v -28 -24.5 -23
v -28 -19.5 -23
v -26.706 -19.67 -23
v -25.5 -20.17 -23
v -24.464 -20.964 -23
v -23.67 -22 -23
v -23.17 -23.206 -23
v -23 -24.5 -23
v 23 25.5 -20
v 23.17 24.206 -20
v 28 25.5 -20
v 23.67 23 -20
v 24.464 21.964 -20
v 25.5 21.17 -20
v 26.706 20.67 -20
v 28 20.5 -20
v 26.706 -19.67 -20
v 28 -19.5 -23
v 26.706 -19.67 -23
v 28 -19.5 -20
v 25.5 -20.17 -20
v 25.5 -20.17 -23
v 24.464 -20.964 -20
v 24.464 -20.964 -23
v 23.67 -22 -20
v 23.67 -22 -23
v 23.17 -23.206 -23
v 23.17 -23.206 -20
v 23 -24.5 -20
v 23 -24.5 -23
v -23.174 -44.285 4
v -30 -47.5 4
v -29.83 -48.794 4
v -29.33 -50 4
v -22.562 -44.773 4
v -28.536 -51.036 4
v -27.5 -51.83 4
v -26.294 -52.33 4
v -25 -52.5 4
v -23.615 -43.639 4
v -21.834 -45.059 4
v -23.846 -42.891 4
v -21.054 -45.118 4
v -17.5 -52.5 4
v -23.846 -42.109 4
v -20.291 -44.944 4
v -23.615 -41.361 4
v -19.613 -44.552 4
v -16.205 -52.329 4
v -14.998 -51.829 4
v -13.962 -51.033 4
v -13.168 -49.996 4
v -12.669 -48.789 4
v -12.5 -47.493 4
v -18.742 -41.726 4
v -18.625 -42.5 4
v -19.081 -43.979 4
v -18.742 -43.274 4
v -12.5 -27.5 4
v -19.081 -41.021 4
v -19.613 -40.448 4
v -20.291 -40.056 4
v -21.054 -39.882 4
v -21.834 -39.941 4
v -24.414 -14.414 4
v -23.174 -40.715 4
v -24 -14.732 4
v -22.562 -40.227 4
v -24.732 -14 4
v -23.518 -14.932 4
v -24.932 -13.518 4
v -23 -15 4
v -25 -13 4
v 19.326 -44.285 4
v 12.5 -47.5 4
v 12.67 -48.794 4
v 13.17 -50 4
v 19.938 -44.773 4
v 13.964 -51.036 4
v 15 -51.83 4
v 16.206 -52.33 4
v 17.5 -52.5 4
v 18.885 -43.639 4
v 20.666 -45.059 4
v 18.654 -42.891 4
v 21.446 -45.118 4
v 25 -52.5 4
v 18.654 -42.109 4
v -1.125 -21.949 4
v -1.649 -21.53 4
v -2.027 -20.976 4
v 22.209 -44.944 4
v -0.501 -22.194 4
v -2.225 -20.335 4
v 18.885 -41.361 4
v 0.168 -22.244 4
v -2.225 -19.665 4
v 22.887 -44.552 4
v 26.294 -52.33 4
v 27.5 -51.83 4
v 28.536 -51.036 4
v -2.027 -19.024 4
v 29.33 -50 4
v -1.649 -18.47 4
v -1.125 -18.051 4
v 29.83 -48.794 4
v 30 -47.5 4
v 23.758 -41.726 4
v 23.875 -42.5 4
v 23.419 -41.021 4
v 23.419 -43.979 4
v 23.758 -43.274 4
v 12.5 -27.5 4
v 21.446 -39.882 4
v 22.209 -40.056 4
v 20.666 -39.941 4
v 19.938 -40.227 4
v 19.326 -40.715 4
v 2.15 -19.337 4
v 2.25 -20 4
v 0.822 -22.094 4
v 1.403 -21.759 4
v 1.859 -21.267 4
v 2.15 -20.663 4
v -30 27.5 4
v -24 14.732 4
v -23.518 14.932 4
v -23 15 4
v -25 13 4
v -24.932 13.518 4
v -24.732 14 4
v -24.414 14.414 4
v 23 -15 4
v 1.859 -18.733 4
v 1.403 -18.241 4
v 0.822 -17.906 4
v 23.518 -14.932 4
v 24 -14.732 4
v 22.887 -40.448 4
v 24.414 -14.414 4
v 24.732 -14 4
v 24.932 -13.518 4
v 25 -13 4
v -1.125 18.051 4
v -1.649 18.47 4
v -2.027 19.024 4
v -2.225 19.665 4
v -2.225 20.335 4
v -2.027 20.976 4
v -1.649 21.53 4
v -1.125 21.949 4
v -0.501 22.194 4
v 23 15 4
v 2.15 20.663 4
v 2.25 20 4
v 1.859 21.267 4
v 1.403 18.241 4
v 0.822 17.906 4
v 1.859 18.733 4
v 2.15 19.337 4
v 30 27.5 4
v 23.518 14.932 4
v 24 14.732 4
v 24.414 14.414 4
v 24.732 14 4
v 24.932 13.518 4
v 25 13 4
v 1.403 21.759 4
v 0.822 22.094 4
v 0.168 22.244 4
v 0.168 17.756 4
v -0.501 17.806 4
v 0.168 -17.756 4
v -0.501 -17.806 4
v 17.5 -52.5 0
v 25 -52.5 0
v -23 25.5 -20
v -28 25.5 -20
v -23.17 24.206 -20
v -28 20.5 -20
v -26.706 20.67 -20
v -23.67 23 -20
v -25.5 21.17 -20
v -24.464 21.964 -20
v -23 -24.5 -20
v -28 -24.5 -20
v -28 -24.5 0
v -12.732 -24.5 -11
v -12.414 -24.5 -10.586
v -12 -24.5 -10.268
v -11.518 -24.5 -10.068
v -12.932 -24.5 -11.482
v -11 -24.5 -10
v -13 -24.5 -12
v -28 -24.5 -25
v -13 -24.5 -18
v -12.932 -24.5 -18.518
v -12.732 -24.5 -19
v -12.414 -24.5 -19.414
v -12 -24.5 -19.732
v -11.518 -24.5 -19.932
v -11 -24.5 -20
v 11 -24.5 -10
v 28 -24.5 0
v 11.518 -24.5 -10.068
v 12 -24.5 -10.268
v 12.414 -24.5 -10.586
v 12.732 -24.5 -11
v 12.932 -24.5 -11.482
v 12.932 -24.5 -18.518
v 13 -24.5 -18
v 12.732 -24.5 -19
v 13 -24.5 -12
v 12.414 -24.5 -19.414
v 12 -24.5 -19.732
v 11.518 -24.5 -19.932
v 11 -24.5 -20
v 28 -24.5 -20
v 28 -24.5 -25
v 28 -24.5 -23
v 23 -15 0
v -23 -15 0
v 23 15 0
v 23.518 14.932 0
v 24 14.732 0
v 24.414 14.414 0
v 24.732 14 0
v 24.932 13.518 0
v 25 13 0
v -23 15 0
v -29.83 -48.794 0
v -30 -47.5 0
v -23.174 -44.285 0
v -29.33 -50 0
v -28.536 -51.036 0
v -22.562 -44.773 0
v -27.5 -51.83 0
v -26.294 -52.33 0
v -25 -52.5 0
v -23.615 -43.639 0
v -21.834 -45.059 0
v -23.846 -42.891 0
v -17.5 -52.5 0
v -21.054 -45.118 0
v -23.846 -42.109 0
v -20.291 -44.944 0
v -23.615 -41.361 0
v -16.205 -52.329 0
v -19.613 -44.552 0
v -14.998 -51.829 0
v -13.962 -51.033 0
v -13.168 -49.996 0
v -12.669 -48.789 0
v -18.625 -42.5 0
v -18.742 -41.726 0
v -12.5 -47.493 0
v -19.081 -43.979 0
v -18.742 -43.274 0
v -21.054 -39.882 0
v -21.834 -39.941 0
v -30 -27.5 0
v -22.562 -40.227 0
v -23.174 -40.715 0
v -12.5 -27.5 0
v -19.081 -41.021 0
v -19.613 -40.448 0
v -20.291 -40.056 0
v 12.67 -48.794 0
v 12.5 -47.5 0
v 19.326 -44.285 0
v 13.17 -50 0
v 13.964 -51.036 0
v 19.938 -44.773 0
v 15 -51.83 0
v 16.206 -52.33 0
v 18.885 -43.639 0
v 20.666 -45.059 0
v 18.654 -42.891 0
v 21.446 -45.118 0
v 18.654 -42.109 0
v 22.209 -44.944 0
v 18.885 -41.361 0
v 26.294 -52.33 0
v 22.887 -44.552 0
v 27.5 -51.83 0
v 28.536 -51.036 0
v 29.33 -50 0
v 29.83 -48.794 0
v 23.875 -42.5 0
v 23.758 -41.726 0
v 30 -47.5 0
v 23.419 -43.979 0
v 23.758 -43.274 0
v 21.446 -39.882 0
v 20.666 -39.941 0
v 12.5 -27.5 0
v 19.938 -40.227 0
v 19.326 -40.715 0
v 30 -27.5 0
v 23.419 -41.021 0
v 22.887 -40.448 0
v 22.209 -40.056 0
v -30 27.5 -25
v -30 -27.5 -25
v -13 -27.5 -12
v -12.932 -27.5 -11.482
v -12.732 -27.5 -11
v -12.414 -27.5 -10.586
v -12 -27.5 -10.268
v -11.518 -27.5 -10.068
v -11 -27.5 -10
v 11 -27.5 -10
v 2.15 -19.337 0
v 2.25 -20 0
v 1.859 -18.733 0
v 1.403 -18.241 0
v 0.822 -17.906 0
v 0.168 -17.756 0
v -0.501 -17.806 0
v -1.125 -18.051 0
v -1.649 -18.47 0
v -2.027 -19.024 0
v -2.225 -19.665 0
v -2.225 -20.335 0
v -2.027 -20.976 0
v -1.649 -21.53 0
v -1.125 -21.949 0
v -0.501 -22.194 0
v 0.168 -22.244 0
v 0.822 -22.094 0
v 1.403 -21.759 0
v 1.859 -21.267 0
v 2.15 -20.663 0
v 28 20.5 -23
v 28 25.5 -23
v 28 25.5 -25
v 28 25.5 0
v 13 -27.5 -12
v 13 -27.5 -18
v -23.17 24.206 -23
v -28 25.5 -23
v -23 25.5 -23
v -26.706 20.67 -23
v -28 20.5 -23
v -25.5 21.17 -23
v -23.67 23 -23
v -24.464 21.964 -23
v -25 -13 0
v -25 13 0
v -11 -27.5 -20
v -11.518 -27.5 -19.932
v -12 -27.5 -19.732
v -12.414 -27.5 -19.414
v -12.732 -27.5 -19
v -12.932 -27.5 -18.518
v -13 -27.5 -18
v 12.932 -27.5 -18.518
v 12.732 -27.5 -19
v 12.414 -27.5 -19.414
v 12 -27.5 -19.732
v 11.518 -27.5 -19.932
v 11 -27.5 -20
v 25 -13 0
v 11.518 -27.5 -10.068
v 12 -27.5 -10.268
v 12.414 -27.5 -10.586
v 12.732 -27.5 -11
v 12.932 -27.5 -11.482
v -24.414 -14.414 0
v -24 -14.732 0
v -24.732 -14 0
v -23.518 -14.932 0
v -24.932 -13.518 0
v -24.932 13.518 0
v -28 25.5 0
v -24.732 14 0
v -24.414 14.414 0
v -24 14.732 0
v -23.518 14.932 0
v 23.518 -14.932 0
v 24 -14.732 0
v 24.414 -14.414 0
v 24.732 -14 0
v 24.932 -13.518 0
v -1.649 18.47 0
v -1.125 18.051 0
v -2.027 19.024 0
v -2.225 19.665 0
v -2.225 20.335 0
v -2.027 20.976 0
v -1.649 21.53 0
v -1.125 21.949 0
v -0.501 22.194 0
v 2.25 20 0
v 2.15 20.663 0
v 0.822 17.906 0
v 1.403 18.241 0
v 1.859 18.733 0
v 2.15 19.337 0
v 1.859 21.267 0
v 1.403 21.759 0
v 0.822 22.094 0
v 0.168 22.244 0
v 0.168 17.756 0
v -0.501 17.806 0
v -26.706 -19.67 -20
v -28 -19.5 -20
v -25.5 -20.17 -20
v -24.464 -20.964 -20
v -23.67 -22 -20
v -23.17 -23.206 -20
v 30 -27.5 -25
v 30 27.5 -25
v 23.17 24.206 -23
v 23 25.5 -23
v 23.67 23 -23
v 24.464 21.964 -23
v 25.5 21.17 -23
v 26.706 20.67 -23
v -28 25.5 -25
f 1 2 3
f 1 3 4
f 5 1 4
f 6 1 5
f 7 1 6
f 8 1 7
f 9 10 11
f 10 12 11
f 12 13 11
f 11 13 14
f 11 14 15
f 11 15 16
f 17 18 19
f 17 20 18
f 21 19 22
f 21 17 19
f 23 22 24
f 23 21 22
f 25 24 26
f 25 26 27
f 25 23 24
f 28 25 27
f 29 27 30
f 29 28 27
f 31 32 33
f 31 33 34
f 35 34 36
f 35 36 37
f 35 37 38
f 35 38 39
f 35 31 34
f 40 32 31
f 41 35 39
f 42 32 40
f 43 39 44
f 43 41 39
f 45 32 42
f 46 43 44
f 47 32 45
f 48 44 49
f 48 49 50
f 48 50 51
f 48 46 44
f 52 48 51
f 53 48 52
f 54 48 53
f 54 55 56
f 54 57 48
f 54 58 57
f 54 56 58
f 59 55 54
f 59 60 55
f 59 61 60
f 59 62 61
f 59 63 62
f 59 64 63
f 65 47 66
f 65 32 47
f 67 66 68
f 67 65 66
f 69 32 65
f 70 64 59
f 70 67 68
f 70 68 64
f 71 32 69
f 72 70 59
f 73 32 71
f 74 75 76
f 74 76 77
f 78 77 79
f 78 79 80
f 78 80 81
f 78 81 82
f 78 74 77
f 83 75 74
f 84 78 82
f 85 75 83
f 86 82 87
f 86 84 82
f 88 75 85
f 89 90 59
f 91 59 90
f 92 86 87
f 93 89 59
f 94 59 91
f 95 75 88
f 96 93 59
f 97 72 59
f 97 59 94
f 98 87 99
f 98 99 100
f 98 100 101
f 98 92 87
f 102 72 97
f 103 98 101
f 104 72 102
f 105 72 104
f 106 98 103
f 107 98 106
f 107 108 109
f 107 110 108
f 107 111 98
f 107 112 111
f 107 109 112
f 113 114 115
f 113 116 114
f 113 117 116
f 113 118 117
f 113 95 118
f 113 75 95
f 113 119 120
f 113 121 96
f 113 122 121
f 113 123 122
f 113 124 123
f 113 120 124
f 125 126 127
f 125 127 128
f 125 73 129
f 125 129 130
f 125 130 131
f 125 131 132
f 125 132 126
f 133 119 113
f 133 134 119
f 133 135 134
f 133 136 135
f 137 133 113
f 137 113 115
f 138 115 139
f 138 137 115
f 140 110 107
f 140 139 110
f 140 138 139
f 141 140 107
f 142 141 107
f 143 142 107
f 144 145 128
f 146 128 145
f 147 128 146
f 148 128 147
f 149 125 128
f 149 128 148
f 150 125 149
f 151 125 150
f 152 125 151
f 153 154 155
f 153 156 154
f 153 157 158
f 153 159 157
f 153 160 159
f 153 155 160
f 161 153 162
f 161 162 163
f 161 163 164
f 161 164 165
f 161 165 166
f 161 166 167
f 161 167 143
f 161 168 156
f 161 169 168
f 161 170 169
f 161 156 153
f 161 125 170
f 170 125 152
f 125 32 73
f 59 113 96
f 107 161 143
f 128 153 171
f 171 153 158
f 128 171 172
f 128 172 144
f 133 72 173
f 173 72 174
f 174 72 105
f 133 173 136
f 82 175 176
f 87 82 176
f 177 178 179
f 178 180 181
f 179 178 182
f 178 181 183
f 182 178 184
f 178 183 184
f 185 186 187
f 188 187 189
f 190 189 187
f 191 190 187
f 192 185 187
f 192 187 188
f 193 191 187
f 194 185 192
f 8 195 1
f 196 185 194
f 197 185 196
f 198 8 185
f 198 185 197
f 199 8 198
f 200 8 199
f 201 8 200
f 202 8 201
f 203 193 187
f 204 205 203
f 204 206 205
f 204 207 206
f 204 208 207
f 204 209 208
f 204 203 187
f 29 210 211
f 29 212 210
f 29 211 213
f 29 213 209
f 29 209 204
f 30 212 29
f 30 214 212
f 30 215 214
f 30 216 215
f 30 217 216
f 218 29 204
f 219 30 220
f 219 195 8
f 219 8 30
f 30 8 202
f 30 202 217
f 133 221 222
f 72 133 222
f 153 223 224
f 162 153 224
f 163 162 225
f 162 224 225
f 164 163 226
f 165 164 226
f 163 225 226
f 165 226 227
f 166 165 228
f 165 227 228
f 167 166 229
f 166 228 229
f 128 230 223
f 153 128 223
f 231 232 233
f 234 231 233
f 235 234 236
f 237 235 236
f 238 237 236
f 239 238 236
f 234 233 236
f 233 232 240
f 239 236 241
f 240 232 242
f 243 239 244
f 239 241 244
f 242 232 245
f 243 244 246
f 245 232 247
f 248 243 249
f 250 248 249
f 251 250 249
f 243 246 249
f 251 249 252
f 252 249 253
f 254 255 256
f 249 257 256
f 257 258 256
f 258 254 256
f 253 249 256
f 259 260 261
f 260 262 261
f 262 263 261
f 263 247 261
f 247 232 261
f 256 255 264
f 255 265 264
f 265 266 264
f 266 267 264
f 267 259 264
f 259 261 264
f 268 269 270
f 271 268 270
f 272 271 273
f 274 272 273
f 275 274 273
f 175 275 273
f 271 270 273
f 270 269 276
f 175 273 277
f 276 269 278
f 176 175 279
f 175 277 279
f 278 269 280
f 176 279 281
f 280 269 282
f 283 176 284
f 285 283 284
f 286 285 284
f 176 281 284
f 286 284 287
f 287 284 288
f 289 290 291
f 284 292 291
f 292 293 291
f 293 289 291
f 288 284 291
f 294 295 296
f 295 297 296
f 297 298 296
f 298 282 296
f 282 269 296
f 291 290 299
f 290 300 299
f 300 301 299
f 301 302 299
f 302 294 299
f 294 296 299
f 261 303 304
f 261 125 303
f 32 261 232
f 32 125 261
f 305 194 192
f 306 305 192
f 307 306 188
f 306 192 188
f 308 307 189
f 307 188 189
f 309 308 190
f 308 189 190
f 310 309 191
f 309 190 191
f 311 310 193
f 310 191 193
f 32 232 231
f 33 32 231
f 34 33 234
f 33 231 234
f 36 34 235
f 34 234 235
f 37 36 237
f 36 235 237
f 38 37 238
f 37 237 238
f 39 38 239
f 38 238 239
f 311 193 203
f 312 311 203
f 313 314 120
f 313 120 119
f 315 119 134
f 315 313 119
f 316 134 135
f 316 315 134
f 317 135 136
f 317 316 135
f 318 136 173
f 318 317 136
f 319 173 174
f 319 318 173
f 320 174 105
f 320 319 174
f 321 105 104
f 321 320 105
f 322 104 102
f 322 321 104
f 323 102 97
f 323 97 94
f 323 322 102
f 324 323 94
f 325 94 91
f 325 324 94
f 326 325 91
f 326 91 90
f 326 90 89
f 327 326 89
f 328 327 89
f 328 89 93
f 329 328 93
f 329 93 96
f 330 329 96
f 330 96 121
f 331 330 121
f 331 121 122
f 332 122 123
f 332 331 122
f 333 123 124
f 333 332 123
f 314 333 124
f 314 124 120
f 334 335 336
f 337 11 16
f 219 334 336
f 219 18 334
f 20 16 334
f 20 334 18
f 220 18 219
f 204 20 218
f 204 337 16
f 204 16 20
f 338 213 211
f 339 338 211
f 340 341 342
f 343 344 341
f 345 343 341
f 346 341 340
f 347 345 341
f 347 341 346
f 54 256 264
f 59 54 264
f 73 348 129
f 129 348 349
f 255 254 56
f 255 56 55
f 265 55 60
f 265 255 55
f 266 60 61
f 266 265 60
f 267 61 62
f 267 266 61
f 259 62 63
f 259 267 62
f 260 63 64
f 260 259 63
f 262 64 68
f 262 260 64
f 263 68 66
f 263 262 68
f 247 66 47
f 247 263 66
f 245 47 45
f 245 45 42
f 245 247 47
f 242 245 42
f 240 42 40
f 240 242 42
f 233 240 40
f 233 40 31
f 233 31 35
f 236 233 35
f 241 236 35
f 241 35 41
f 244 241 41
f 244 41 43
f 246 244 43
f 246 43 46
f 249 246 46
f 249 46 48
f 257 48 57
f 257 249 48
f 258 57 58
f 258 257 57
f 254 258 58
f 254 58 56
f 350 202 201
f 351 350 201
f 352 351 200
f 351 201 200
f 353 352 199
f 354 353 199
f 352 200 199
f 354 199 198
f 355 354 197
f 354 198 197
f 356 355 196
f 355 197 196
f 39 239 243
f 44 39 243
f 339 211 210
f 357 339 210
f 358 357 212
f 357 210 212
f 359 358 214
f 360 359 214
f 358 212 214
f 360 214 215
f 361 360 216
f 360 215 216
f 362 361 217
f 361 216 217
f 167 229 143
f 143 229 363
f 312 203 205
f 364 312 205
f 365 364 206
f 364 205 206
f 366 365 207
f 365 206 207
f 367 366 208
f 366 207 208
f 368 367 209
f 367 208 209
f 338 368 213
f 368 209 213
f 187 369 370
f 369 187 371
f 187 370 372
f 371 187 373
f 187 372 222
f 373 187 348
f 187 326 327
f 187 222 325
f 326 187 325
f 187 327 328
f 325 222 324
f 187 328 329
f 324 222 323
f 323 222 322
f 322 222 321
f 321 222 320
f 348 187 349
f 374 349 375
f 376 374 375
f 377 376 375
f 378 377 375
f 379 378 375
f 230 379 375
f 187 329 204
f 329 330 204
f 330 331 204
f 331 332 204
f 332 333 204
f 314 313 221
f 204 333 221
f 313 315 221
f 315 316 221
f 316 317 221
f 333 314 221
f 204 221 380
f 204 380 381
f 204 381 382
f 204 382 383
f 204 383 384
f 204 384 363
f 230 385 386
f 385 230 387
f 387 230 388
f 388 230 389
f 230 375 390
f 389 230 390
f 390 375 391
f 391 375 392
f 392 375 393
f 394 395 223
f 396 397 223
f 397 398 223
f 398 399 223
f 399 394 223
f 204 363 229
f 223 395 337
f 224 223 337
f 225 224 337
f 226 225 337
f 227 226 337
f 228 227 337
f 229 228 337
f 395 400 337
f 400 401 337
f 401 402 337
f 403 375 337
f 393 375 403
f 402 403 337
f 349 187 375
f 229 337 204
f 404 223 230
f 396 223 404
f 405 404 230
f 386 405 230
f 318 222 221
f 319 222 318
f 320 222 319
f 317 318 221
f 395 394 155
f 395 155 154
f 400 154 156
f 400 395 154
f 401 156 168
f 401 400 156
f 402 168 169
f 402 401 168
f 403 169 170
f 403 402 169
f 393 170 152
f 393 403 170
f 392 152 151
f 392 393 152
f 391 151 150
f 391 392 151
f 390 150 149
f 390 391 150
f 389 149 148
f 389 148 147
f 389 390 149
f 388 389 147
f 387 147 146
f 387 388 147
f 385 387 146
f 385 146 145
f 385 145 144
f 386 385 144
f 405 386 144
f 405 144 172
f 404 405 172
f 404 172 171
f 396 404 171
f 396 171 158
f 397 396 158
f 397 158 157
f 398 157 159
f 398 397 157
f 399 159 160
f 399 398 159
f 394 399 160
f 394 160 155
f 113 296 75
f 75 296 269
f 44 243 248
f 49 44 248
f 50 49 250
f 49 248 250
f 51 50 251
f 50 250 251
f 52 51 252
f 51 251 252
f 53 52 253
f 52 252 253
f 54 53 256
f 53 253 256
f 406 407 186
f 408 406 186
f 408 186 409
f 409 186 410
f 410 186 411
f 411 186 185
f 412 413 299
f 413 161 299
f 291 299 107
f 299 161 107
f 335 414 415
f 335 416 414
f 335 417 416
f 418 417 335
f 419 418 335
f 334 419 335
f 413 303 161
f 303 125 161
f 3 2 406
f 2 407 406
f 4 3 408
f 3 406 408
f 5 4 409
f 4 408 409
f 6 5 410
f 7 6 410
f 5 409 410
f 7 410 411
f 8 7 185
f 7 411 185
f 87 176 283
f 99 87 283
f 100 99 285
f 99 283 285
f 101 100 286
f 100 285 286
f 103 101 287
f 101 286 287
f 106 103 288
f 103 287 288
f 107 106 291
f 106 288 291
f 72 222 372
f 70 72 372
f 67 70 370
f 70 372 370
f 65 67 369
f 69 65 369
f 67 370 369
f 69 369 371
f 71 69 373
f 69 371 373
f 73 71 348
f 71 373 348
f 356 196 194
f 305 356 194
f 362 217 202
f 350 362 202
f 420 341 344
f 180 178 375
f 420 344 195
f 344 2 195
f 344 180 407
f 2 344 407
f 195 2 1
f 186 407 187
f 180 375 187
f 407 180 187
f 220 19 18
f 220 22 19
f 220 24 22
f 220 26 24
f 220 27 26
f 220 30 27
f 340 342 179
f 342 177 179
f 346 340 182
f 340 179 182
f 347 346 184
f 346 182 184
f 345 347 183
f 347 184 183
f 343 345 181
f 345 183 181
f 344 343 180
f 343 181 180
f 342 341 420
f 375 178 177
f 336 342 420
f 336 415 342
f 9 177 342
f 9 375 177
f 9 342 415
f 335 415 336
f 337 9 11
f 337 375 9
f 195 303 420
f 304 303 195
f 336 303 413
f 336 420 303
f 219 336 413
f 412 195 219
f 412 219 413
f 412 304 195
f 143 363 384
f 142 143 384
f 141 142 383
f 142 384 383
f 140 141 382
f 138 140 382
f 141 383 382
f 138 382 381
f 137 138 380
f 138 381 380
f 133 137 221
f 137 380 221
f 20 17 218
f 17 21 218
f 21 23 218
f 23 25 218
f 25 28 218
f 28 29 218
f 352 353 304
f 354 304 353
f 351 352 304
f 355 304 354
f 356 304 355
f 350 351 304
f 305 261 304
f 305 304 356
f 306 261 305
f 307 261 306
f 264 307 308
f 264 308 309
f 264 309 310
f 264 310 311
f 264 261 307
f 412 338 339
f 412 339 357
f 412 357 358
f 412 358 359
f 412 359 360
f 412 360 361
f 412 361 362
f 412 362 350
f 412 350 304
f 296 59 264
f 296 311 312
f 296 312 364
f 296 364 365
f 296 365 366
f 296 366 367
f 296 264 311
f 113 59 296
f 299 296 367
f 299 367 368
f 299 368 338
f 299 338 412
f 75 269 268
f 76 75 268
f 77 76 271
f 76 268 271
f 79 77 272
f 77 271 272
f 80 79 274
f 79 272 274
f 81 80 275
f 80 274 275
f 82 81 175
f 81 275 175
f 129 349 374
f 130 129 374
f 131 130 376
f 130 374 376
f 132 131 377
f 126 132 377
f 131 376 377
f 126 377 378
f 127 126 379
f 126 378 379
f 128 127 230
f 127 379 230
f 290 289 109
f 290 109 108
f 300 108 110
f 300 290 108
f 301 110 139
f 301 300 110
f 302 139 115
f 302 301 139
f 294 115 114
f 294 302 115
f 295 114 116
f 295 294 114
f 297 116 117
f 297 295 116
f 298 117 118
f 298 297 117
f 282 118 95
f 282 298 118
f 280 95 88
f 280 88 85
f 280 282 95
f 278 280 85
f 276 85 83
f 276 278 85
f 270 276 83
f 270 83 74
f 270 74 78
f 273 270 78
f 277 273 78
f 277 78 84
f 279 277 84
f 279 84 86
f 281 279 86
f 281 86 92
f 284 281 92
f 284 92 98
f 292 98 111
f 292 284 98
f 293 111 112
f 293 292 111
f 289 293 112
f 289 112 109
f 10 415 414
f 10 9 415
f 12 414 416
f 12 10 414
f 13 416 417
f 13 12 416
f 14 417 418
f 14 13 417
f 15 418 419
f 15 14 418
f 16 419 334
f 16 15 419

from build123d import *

# Parameters (mm, degrees)
F0_R     = 2.25
F0_R_2   = 2.625
F1_DEPTH = 4
F2_W     = 60
F2_H     = 55
F2_W_2   = 56
F2_H_2   = 50
F3_DEPTH = 25
F5_DEPTH = 25
F6_W     = 5
F6_H     = 5
F7_DEPTH = 5
F8_W     = 56
F8_H     = 50
F9_DEPTH = 2
F10_R    = 4.99999


# Not quite as in the source:
# - a fillet or chamfer is up to 0.001 mm smaller than in the source, because OpenCascade refuses the exact size


with BuildPart() as f1:
    # F0 (on Top) → F1 (new body)
    with BuildSketch(Plane.XY):
        Polygon((30, 27.5), (-30, 27.5), (-30, -27.5), (-12.5000044162, -27.5), (12.5, -27.5), (30, -27.5), align=None)
        with Locations((0, -20)):
            Circle(F0_R, mode=Mode.SUBTRACT)
        with BuildLine():
            ThreePointArc((-25, 13), (-24.4142135624, 14.4142135624), (-23, 15))
            Line((-23, 15), (23, 15))
            ThreePointArc((23, 15), (24.4142135624, 14.4142135624), (25, 13))
            Line((25, 13), (25, -13))
            ThreePointArc((25, -13), (24.4142135624, -14.4142135624), (23, -15))
            Line((23, -15), (-23, -15))
            ThreePointArc((-23, -15), (-24.4142135624, -14.4142135624), (-25, -13))
            Line((-25, -13), (-25, 13))
        make_face(mode=Mode.SUBTRACT)
        with Locations((0, 20)):
            Circle(F0_R, mode=Mode.SUBTRACT)
        with BuildLine():
            Line((-12.5000044162, -27.5), (-30, -27.5))
            Line((-30, -27.5), (-30, -47.5))
            ThreePointArc((-30, -47.5), (-28.5355339059, -51.0355339059), (-25, -52.5))
            Line((-25, -52.5), (-17.5, -52.5))
            ThreePointArc((-17.5, -52.5), (-13.9621173589, -51.0331836094), (-12.5000044162, -47.4933545672))
            Line((-12.5000044162, -47.4933545672), (-12.5000044162, -27.5))
        make_face()
        with Locations((-21.25, -42.5)):
            Circle(F0_R_2, mode=Mode.SUBTRACT)
        with BuildLine():
            Line((30, -47.5), (30, -27.5))
            Line((30, -27.5), (12.5, -27.5))
            Line((12.5, -27.5), (12.5, -47.5))
            ThreePointArc((12.5, -47.5), (13.9644660941, -51.0355339059), (17.5, -52.5))
            Line((17.5, -52.5), (25, -52.5))
            ThreePointArc((25, -52.5), (28.5355339059, -51.0355339059), (30, -47.5))
        make_face()
        with Locations((21.25, -42.5)):
            Circle(F0_R_2, mode=Mode.SUBTRACT)
    extrude(amount=F1_DEPTH)

    # F2 (on face) → F3 (join)
    with BuildSketch(Plane(origin=(0, 0, 0), x_dir=(1, 0, 0), z_dir=(0, 0, -1))):
        Rectangle(F2_W, F2_H)
        with Locations((0, -0.5)):
            Rectangle(F2_W_2, F2_H_2, mode=Mode.SUBTRACT)
    extrude(amount=F3_DEPTH)

    # F4 (on face) → F5 (cut)
    with BuildSketch(Plane(origin=(0, -24.5, 0), x_dir=(-1, 0, 0), z_dir=(0, 1, 0))):
        with BuildLine():
            Line((11, -10), (-11, -10))
            ThreePointArc((-11, -10), (-12.4142135624, -10.5857864376), (-13, -12))
            Line((-13, -12), (-13, -18))
            ThreePointArc((-13, -18), (-12.4142135624, -19.4142135624), (-11, -20))
            Line((-11, -20), (11, -20))
            ThreePointArc((11, -20), (12.4142135624, -19.4142135624), (13, -18))
            Line((13, -18), (13, -12))
            ThreePointArc((13, -12), (12.4142135624, -10.5857864376), (11, -10))
        make_face()
    extrude(amount=-F5_DEPTH, mode=Mode.SUBTRACT)

    # F6 (on face) → F7 (join)
    with BuildSketch(Plane(origin=(0, 0, -25), x_dir=(1, 0, 0), z_dir=(0, 0, -1))):
        with Locations((-25.5, 22)):
            Rectangle(F6_W, F6_H)
        with Locations((25.5, 22)):
            Rectangle(F6_W, F6_H)
        with Locations((25.5, -23)):
            Rectangle(F6_W, F6_H)
        with Locations((-25.5, -23)):
            Rectangle(F6_W, F6_H)
    extrude(amount=-F7_DEPTH)

    # F8 (on face) → F9 (cut)
    with BuildSketch(Plane(origin=(0, 0, -25), x_dir=(1, 0, 0), z_dir=(0, 0, -1))):
        with Locations((0, -0.5)):
            Rectangle(F8_W, F8_H)
    extrude(amount=-F9_DEPTH, mode=Mode.SUBTRACT)

    # F10 (radius 5 in the source; OpenCascade refuses exactly that, so slightly less here)
    f10_edges = [f1.edges().sort_by_distance(p)[0] for p in [
        (-23, -19.5, -21.5),
        (23, -19.5, -21.5),
        (23, 20.5, -21.5),
        (-23, 20.5, -21.5),
    ]]
    fillet(f10_edges, radius=F10_R)


solid = f1.part
